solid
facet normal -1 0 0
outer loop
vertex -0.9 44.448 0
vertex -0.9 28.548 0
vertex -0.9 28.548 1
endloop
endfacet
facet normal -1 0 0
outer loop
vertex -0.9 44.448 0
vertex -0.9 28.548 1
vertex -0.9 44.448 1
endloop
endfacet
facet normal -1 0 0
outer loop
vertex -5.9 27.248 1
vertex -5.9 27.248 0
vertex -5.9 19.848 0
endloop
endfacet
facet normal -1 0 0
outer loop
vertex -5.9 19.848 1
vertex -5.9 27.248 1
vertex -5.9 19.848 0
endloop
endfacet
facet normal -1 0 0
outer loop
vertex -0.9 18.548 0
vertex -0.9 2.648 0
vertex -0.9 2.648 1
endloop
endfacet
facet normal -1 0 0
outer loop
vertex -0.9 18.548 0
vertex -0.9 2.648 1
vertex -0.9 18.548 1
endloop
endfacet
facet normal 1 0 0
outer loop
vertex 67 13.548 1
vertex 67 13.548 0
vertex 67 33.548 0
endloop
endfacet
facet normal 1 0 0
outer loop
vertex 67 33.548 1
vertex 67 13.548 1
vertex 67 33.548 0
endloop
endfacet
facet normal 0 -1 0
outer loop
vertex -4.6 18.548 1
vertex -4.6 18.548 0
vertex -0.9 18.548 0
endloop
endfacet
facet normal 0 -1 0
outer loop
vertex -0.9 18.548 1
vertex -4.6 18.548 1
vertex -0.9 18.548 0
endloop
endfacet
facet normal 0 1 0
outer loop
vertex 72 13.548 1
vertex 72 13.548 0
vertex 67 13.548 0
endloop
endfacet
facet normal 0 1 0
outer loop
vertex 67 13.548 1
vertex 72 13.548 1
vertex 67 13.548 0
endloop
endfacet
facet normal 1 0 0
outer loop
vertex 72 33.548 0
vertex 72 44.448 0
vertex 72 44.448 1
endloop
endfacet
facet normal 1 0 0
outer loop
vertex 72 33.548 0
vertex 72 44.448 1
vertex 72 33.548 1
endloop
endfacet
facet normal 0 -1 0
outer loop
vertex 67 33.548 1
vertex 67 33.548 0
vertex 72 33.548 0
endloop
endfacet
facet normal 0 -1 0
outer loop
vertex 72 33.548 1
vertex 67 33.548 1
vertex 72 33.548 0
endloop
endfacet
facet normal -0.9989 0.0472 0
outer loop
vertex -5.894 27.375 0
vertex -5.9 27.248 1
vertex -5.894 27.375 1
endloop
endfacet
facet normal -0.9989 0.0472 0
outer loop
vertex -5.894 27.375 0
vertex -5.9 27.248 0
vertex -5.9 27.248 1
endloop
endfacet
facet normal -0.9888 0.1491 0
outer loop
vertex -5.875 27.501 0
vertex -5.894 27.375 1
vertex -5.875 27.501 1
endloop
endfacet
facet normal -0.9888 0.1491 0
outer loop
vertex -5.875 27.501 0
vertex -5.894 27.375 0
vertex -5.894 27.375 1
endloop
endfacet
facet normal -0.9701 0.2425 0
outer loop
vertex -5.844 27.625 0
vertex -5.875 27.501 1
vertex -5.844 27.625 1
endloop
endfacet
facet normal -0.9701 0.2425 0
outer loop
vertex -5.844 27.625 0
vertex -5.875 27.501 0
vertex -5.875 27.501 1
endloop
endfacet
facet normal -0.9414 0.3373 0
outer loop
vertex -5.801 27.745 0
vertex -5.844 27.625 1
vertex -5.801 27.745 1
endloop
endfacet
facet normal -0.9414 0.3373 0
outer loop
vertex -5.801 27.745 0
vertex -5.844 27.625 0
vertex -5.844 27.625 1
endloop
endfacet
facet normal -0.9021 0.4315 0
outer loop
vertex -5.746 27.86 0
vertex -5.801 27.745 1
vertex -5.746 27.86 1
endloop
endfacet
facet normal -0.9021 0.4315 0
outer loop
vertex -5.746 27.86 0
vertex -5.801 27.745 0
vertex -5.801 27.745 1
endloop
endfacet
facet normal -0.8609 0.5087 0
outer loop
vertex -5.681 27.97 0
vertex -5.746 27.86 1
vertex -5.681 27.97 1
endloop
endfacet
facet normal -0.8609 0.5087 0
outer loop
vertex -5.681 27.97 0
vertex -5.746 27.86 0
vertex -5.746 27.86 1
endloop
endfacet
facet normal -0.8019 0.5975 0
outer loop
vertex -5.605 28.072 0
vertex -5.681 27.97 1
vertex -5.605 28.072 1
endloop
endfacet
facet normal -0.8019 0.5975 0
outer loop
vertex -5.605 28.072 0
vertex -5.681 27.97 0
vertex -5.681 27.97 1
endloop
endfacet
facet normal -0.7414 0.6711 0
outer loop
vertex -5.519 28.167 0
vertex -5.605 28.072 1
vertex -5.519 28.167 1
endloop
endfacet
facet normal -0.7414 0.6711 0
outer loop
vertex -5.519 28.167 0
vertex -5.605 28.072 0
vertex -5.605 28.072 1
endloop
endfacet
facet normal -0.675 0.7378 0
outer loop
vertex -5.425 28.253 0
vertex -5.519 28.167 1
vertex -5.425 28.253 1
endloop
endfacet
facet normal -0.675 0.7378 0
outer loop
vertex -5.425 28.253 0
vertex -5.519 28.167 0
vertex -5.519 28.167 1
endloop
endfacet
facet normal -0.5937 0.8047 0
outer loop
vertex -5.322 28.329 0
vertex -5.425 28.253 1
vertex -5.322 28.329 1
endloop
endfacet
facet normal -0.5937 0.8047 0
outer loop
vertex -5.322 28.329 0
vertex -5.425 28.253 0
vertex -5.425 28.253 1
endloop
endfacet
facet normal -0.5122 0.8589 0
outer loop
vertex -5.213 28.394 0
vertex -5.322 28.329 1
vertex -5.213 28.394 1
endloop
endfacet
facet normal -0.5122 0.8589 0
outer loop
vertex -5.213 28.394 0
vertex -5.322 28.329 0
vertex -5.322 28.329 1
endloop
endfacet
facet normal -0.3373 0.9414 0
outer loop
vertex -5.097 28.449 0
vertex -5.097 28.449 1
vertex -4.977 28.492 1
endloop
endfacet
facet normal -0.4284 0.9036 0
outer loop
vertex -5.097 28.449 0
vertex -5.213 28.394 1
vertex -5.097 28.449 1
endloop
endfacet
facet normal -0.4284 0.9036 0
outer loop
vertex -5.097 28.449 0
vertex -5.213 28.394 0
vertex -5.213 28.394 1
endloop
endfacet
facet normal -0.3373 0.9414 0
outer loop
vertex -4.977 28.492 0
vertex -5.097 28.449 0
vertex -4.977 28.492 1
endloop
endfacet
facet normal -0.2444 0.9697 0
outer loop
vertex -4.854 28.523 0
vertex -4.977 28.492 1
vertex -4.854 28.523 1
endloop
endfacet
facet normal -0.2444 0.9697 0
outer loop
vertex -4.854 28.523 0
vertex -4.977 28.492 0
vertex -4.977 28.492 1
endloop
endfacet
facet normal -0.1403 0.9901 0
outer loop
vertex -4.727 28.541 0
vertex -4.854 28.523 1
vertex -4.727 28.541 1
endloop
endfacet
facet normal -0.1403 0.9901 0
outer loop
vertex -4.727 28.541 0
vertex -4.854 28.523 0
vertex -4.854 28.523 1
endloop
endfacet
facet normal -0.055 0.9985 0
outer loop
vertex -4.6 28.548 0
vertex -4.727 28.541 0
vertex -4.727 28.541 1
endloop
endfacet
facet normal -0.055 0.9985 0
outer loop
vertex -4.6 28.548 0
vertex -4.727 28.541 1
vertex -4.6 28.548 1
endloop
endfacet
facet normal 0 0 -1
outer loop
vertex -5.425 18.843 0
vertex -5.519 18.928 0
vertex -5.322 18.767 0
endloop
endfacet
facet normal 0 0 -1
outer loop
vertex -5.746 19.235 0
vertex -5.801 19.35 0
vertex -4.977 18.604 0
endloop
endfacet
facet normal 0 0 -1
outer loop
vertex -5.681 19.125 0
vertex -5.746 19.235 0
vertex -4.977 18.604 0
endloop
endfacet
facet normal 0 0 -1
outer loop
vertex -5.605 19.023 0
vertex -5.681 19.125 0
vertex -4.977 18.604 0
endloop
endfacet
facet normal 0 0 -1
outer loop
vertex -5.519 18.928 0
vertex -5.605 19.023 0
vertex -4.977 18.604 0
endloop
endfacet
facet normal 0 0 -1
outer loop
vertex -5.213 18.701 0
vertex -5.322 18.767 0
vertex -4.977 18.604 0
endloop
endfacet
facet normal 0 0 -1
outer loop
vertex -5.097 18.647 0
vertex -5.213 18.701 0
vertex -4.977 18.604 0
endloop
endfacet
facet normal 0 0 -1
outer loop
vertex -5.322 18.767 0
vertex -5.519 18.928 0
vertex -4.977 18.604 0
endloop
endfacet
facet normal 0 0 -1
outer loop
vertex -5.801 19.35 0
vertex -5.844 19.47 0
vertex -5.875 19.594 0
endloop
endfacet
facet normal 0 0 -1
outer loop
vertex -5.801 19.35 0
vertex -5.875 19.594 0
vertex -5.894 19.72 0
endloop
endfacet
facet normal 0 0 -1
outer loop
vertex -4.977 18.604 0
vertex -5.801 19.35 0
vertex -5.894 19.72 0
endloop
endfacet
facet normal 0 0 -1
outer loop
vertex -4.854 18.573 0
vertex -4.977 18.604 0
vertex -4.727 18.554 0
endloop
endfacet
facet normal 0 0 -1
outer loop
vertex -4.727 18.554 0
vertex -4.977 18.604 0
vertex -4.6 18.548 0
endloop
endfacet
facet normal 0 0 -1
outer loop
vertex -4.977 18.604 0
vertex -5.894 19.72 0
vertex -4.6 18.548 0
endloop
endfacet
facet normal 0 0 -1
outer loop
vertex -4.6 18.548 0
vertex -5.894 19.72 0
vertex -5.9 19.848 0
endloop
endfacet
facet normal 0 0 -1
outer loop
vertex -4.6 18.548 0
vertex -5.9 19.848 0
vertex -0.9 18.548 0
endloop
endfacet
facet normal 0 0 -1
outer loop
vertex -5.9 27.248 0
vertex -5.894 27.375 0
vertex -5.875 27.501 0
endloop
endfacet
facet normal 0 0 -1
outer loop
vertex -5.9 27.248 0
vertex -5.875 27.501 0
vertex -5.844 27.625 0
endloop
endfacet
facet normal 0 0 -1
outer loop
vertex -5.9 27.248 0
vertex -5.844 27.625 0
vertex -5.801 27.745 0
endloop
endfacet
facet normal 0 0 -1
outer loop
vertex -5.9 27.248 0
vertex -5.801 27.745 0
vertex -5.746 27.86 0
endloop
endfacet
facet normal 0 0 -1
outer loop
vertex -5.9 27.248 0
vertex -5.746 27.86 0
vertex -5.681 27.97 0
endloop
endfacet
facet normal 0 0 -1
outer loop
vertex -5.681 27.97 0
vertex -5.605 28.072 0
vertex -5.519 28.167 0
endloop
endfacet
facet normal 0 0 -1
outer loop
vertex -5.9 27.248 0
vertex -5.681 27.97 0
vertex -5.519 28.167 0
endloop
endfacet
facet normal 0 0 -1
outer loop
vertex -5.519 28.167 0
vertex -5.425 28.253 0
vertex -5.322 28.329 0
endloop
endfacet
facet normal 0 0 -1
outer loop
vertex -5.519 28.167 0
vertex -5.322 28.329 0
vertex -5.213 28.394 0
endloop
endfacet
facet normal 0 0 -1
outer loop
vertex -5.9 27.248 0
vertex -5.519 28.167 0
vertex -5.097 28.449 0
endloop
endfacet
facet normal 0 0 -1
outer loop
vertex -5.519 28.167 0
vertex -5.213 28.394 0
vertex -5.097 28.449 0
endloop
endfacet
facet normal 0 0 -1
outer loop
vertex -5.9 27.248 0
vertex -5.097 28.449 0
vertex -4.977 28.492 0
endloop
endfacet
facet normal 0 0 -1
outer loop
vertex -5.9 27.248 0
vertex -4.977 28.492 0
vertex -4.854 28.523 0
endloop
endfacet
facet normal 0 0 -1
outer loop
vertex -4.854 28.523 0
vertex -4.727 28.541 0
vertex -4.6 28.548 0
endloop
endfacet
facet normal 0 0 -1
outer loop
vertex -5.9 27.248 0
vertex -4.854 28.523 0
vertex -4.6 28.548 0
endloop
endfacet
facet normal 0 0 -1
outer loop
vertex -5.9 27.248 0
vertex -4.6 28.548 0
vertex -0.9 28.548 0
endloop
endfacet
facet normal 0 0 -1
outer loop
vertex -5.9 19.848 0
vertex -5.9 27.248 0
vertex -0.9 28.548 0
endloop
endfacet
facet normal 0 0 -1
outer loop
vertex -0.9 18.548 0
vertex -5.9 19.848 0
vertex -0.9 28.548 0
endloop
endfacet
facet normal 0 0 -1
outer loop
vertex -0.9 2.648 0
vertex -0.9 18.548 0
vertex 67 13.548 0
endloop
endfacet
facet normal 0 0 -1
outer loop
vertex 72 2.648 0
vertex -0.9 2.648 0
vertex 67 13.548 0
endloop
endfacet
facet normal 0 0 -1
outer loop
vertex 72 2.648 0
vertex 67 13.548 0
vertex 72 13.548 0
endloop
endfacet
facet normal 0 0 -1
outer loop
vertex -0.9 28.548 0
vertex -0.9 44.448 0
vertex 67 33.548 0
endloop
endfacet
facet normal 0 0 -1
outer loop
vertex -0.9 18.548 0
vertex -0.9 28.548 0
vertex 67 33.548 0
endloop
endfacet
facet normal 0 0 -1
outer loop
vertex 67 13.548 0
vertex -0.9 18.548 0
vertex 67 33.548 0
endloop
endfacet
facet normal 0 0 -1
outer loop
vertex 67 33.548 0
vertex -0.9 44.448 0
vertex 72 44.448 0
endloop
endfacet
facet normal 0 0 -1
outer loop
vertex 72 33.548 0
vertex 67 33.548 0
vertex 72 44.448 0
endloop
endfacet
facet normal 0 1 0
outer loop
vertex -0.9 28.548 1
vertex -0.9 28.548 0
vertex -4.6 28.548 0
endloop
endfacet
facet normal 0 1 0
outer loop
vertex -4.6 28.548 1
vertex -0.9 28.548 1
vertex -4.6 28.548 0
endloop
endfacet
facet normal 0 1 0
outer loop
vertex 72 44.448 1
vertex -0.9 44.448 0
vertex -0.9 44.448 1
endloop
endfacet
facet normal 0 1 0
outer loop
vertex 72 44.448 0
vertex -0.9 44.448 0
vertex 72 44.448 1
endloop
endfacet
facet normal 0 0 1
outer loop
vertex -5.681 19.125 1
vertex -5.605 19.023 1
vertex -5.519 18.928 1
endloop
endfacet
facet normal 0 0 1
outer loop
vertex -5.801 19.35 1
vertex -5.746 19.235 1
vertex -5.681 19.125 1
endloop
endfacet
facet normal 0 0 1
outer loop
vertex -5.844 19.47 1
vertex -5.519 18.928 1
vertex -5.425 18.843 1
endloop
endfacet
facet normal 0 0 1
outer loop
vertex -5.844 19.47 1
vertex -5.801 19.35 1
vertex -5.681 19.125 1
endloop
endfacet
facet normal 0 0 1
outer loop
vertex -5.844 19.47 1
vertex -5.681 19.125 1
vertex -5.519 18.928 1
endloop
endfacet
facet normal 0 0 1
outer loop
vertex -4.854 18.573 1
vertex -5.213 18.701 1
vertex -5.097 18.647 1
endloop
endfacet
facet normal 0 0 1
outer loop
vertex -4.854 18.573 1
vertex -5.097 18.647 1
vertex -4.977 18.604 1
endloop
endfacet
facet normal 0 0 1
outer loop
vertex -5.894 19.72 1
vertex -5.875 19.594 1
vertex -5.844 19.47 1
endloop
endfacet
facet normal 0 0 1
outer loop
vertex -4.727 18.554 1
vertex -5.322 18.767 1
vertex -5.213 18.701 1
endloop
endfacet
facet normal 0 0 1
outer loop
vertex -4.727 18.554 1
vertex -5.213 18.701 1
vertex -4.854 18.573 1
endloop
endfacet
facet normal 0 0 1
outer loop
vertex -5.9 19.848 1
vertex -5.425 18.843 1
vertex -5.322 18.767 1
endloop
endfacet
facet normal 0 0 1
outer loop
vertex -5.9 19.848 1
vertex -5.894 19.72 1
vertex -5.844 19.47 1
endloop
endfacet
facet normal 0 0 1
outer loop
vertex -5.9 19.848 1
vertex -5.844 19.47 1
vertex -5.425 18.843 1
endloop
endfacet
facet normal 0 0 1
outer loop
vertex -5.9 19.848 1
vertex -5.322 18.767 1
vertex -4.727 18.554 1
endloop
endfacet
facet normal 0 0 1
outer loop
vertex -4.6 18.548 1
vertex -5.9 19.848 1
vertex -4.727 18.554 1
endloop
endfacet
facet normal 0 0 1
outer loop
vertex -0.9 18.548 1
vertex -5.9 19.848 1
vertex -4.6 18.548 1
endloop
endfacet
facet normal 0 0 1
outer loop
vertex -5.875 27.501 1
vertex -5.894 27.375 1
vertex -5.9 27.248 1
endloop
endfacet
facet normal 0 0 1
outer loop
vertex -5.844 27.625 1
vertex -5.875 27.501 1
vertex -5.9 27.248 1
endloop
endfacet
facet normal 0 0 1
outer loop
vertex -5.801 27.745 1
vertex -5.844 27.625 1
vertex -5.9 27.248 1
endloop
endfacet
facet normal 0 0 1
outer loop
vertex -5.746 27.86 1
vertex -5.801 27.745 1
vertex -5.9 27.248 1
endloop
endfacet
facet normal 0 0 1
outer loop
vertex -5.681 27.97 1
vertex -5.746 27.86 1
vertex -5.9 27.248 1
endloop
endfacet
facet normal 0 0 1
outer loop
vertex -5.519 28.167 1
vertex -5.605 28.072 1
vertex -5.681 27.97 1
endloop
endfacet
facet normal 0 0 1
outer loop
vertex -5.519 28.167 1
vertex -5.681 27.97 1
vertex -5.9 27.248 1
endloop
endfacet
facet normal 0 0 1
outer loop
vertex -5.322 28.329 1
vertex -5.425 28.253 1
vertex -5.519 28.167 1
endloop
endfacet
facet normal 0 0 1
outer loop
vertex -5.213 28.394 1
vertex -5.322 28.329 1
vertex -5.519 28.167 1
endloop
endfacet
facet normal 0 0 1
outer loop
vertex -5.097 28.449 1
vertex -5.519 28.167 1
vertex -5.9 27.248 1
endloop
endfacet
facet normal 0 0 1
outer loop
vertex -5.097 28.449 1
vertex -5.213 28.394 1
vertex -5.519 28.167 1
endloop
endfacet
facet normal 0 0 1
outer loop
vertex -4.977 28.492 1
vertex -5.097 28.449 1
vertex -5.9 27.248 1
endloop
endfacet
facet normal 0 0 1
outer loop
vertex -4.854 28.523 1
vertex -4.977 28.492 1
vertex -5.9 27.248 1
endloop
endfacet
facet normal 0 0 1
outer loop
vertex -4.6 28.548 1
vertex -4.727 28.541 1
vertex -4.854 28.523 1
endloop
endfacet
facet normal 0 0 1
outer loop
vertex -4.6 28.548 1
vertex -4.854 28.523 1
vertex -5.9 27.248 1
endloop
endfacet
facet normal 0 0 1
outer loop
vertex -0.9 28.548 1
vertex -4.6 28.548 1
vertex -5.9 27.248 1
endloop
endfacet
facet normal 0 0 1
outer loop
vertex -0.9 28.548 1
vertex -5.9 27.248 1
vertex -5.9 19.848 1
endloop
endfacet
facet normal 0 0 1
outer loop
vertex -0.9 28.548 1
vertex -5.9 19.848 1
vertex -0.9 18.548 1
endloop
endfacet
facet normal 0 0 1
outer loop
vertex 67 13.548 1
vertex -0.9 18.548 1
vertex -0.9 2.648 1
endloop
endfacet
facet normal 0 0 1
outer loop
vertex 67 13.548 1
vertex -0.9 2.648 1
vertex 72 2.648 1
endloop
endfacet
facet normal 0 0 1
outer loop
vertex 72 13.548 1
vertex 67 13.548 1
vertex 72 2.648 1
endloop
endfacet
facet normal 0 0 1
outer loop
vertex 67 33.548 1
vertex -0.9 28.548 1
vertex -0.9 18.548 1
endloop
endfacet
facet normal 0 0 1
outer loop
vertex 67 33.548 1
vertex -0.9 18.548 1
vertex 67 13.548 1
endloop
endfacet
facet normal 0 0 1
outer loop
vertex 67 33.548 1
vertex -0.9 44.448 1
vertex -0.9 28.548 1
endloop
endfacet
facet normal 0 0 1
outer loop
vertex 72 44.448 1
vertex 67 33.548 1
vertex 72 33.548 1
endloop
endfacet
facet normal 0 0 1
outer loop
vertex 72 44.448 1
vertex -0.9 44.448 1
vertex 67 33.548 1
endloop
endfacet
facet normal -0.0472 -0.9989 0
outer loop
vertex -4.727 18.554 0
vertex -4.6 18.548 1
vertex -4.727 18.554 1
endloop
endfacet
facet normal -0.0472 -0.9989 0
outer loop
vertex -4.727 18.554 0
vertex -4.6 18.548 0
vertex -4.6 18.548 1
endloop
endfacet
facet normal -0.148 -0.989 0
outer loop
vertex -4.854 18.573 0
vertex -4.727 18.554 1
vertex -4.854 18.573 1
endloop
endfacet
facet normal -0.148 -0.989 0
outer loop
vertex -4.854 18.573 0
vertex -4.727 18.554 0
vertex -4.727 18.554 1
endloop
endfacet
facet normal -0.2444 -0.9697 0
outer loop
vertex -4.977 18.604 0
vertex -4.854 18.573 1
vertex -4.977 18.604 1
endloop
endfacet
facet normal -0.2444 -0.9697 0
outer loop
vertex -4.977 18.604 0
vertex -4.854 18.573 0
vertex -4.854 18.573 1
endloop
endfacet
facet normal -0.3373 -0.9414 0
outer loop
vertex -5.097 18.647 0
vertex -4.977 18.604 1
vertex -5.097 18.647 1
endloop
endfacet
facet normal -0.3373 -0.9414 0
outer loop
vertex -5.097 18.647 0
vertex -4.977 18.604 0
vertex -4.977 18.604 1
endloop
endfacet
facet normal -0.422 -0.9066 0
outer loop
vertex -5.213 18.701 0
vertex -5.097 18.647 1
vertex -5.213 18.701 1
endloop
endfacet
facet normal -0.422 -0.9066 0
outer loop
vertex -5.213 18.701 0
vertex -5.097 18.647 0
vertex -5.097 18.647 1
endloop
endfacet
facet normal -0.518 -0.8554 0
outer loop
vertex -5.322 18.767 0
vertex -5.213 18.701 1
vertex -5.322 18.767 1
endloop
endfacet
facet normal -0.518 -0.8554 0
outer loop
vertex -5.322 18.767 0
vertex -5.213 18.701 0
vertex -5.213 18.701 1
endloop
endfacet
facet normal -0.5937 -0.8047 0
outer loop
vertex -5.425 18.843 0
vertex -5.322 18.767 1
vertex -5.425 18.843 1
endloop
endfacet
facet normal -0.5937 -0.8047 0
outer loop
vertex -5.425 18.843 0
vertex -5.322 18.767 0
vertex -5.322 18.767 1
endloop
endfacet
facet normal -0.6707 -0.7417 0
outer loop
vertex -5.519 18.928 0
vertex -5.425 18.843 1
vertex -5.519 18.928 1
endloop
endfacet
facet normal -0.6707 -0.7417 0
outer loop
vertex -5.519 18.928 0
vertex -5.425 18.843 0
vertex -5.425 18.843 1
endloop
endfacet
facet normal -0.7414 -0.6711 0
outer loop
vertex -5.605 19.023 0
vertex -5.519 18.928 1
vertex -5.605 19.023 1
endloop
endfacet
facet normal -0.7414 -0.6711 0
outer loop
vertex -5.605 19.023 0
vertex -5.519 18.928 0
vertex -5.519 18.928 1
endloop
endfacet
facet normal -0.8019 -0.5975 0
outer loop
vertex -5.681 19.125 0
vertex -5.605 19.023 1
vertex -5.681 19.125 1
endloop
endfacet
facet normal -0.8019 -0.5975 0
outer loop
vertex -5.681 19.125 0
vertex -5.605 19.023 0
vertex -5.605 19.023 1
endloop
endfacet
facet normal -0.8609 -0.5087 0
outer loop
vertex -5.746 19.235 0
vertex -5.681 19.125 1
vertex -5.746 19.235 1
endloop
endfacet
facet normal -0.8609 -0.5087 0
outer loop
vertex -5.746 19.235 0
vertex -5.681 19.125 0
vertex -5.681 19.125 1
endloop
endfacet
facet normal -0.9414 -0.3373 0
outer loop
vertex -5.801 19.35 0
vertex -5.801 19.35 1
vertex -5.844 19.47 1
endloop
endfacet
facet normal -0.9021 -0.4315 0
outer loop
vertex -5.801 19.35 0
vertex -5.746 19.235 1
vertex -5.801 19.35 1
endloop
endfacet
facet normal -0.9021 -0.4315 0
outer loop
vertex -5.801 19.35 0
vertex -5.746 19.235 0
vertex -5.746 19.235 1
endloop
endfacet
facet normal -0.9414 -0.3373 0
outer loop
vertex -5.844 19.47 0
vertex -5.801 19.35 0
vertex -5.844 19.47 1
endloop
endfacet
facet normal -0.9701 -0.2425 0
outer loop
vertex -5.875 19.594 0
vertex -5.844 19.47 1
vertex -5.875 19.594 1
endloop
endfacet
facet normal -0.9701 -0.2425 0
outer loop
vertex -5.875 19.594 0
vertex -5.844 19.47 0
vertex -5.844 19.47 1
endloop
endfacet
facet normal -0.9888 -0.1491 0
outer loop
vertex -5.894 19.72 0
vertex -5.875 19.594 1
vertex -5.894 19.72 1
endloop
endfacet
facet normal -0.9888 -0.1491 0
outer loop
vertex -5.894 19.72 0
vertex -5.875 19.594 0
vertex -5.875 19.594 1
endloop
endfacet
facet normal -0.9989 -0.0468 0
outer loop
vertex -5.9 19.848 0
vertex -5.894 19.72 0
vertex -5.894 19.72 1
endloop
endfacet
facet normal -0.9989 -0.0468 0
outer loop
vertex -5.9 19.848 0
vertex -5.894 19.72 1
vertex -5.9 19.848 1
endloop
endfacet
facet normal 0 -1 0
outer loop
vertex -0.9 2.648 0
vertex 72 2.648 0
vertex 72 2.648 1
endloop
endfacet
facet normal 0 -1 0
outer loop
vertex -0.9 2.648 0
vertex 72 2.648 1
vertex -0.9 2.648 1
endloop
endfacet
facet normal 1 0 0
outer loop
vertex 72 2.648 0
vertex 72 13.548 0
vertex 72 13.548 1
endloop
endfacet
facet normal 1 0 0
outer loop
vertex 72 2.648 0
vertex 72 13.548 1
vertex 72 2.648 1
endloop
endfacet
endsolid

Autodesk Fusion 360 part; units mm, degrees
sketch "Sketch1" plane through (0, 0, 0) normal (0, 0, 1) x (1, 0, 0)
  line L0 (-0.9, 44.4476) -> (72, 44.4476)
  line L1 (72, 44.4476) -> (72, 2.6476)
  line L2 (72, 2.6476) -> (-0.9, 2.6476)
  line L3 (-0.9, 2.6476) -> (-0.9, 44.4476)
  line L4 (-0.9, 23.5476) -> (72, 23.5476) construction
  line L5 (72, 13.5476) -> (67, 13.5476)
  line L6 (67, 13.5476) -> (67, 33.5476)
  line L7 (67, 33.5476) -> (72, 33.5476)
  line L8 (72, 33.5476) -> (72, 13.5476)
  line L9 (-0.9, 28.5476) -> (-4.6, 28.5476)
  line L10 (-5.9, 27.2476) -> (-5.9, 19.8476)
  line L11 (-4.6, 18.5476) -> (-0.9, 18.5476)
  line L12 (-0.9, 18.5476) -> (-0.9, 28.5476)
  arc A0 (-4.6, 28.5476) -> (-5.9, 27.2476) centre (-4.6, 27.2476) ccw
  arc A1 (-5.9, 19.8476) -> (-4.6, 18.5476) centre (-4.6, 19.8476) ccw
  point P0 (-5.9, 28.5476)
  point P1 (-5.9, 18.5476)
  dimension "d1" = 72.9
  dimension "d2" = 41.8
  dimension "d5" = 20
  dimension "d6" = 5
  dimension "d7" = 10
  dimension "d8" = 5
  dimension "d9" = 1.3
extrude "Extrude1" add sketch "Sketch1" along normal blind 1 contours L0 L1 L2 L3 L5 L6 L7 L12 | L3 L9 L10 L11 L12 A0 A1
